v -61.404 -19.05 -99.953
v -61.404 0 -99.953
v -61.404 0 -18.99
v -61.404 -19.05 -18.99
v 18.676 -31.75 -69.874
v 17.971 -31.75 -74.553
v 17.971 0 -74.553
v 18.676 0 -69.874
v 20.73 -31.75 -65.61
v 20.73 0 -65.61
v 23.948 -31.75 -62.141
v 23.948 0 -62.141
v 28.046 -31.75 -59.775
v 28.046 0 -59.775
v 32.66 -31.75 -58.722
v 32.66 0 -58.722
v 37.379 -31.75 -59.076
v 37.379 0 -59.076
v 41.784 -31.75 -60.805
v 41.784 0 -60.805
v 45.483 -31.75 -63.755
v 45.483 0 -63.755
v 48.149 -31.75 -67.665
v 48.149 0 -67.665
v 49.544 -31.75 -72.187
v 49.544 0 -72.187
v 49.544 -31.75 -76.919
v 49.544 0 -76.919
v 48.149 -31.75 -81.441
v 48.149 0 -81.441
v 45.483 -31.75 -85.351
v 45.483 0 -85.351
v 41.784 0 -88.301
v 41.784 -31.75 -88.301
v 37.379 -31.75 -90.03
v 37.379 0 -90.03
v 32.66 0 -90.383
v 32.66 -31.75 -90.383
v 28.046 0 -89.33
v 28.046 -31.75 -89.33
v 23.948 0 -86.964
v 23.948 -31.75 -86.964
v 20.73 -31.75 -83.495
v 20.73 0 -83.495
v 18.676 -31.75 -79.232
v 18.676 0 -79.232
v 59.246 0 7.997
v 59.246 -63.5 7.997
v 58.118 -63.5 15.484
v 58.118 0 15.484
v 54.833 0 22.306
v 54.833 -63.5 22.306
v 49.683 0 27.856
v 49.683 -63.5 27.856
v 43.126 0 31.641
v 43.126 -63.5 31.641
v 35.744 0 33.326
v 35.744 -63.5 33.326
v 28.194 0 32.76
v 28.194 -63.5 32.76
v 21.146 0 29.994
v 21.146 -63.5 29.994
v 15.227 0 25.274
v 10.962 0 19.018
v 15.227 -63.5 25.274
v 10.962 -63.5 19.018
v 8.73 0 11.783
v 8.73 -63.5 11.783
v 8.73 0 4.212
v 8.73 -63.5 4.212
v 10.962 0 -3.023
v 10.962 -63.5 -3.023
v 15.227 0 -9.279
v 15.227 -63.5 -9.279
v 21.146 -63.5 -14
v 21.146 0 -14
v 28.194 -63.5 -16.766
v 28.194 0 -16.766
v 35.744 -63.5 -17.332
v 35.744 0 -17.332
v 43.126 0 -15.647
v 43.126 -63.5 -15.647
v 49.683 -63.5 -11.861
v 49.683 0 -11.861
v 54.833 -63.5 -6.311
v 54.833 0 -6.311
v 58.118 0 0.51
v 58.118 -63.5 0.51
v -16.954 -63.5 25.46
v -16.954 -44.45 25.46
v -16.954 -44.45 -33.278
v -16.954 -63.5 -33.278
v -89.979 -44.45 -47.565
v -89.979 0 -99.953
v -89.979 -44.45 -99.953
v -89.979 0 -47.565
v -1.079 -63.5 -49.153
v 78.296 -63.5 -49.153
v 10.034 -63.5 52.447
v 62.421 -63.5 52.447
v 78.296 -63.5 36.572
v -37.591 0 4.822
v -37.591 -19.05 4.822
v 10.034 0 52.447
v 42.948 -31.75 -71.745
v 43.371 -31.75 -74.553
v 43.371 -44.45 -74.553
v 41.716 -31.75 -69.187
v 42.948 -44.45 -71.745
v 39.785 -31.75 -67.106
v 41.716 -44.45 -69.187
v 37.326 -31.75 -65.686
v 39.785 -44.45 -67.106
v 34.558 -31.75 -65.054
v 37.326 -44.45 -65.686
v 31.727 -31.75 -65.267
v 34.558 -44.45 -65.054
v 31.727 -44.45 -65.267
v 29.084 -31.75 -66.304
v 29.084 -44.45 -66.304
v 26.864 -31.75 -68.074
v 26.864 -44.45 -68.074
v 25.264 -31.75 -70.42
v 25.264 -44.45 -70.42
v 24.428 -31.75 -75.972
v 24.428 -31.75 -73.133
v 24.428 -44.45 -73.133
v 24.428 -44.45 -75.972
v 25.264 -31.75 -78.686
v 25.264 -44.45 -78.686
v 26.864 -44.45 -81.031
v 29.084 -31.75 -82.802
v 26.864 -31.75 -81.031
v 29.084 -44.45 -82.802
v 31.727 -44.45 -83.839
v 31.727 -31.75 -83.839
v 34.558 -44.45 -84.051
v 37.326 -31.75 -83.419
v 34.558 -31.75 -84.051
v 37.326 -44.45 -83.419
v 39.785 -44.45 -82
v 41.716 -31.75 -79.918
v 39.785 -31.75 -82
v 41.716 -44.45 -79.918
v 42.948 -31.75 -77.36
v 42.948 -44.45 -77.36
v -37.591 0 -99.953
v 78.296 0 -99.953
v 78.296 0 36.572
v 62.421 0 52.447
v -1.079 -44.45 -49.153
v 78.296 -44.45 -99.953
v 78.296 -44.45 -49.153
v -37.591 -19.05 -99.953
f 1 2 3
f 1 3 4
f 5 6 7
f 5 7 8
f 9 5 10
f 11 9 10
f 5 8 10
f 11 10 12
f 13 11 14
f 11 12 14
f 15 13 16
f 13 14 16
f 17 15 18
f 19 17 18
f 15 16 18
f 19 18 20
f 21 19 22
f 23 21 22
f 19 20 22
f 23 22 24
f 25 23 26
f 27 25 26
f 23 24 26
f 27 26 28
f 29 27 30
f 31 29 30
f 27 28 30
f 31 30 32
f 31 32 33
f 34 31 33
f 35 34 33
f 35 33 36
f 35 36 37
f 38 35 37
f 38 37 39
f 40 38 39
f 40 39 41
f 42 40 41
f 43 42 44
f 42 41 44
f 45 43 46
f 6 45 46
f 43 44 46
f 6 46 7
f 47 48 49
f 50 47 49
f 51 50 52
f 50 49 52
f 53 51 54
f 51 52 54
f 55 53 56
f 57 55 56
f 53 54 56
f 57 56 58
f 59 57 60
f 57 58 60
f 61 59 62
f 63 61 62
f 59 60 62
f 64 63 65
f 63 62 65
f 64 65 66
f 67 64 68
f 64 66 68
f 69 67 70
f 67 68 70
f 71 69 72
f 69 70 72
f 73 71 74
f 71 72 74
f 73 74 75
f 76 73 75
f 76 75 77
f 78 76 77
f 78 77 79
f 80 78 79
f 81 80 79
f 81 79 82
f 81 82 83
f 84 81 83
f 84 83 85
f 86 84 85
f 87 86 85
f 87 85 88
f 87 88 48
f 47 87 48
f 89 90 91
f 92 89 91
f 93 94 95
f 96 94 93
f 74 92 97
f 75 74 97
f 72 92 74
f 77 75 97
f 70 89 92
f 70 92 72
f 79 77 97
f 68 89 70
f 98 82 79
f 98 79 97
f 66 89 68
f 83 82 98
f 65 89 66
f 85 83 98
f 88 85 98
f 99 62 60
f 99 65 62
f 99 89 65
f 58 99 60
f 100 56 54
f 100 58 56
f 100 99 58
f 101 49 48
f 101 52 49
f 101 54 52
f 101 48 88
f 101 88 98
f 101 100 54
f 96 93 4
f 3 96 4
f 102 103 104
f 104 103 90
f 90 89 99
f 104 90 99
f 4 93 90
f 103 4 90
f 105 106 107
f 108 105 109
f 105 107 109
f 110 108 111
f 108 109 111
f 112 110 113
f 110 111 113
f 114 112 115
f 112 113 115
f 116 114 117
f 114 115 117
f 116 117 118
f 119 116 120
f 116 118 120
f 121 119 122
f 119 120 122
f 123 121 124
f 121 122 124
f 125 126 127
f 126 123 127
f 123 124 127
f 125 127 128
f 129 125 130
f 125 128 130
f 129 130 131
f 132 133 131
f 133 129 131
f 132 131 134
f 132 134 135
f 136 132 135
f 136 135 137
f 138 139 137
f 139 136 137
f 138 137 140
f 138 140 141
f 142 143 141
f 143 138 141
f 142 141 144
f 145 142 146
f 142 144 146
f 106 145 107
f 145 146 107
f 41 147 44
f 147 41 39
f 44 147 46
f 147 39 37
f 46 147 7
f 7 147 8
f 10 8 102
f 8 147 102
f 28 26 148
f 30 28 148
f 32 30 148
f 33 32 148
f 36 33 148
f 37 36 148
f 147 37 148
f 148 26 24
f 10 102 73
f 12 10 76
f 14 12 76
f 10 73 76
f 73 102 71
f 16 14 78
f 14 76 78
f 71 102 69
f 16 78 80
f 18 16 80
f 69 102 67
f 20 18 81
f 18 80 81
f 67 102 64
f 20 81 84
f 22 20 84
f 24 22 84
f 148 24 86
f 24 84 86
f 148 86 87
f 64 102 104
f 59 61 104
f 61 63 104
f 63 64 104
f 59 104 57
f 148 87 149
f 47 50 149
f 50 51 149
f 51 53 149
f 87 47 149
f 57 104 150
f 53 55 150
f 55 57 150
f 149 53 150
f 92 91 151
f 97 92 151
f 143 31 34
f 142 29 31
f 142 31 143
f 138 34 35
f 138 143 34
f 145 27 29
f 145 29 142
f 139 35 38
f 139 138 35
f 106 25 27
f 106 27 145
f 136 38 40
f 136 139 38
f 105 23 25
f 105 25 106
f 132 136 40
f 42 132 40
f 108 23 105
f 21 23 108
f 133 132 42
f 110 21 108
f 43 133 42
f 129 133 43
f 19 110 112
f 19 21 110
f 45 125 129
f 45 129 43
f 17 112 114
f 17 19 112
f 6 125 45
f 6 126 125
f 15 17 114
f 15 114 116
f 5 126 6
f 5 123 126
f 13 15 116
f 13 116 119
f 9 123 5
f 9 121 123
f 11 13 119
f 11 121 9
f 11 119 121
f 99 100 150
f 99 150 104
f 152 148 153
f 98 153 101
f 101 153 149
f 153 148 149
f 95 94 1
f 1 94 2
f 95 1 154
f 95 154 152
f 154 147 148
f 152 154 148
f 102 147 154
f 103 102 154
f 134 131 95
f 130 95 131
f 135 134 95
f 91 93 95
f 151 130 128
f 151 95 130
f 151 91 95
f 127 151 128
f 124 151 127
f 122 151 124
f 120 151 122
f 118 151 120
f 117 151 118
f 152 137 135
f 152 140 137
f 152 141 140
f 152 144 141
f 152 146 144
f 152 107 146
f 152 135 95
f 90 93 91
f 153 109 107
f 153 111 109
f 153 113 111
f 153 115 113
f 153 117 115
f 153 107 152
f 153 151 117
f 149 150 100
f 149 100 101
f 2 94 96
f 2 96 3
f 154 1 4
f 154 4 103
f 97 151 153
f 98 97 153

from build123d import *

# Parameters (mm, degrees)
F0_W      = 168.275
F0_H      = 152.4
F1_DEPTH  = 44.45
F3_DEPTH  = 44.451
F4_W      = 23.8125
F4_H      = 19.05
F5_DEPTH  = 152.401
F7_DEPTH  = 19.05
F8_R      = 25.4
F9_DEPTH  = 63.501
F10_R     = 9.525
F11_DEPTH = 44.451
F12_R     = 15.875
F12_R_2   = 9.525
F13_DEPTH = 31.75


with BuildPart() as f1:
    # F0 (on Front) → F1 (new body)
    with BuildSketch(Plane.XZ):
        with Locations((-5.8413036168, -23.7527878196)):
            Rectangle(F0_W, F0_H)
    extrude(amount=F1_DEPTH)

    # F2 (on face) → F3 (cut, through all)
    with BuildSketch(Plane.XZ.offset(44.45)):
        Polygon((-89.9788036168, 52.4472121804), (-89.9788036168, -47.5652878196), (10.0336963832, 52.4472121804), align=None)
    extrude(amount=-F3_DEPTH, mode=Mode.SUBTRACT)

    # F4 (on face) → F5 (cut, through all)
    with BuildSketch(Plane(origin=(0, 0, -99.9527878196), x_dir=(1, 0, 0), z_dir=(0, 0, -1))):
        with Locations((-49.4975536168, 9.525)):
            Rectangle(F4_W, F4_H)
    extrude(amount=-F5_DEPTH, mode=Mode.SUBTRACT)

    # F6 (on face) → F7 (join)
    with BuildSketch(Plane.XZ.offset(44.45)):
        Polygon((-1.0788036168, -49.1527878196), (78.2961963832, -49.1527878196), (78.2961963832, 52.4472121804), (10.0336963832, 52.4472121804), (-16.9538036168, 25.4597121804), (-16.9538036168, -33.2777878196), align=None)
    extrude(amount=F7_DEPTH)

    # F8 (on face) → F9 (cut, through all)
    with BuildSketch(Plane.XZ.offset(63.5)):
        with Locations((33.8461963832, 7.9972121804)):
            Circle(F8_R)
        Polygon((78.2961963832, 52.4472121804), (62.4211963832, 52.4472121804), (78.2961963832, 36.5722121804), align=None)
    extrude(amount=-F9_DEPTH, mode=Mode.SUBTRACT)

    # F10 (on face) → F11 (cut, through all)
    with BuildSketch(Plane.XZ.offset(44.45)):
        with Locations((33.8461963832, -74.5527878196)):
            Circle(F10_R)
    extrude(amount=-F11_DEPTH, mode=Mode.SUBTRACT)

    # F12 (on face) → F13 (cut)
    with BuildSketch(Plane(origin=(0, 0, 0), x_dir=(-1, 0, 0), z_dir=(0, 1, 0))):
        with Locations((-33.8461963832, -74.5527878196)):
            Circle(F12_R)
        with Locations((-33.8461963832, -74.5527878196)):
            Circle(F12_R_2, mode=Mode.SUBTRACT)
    extrude(amount=-F13_DEPTH, mode=Mode.SUBTRACT)


solid = f1.part
